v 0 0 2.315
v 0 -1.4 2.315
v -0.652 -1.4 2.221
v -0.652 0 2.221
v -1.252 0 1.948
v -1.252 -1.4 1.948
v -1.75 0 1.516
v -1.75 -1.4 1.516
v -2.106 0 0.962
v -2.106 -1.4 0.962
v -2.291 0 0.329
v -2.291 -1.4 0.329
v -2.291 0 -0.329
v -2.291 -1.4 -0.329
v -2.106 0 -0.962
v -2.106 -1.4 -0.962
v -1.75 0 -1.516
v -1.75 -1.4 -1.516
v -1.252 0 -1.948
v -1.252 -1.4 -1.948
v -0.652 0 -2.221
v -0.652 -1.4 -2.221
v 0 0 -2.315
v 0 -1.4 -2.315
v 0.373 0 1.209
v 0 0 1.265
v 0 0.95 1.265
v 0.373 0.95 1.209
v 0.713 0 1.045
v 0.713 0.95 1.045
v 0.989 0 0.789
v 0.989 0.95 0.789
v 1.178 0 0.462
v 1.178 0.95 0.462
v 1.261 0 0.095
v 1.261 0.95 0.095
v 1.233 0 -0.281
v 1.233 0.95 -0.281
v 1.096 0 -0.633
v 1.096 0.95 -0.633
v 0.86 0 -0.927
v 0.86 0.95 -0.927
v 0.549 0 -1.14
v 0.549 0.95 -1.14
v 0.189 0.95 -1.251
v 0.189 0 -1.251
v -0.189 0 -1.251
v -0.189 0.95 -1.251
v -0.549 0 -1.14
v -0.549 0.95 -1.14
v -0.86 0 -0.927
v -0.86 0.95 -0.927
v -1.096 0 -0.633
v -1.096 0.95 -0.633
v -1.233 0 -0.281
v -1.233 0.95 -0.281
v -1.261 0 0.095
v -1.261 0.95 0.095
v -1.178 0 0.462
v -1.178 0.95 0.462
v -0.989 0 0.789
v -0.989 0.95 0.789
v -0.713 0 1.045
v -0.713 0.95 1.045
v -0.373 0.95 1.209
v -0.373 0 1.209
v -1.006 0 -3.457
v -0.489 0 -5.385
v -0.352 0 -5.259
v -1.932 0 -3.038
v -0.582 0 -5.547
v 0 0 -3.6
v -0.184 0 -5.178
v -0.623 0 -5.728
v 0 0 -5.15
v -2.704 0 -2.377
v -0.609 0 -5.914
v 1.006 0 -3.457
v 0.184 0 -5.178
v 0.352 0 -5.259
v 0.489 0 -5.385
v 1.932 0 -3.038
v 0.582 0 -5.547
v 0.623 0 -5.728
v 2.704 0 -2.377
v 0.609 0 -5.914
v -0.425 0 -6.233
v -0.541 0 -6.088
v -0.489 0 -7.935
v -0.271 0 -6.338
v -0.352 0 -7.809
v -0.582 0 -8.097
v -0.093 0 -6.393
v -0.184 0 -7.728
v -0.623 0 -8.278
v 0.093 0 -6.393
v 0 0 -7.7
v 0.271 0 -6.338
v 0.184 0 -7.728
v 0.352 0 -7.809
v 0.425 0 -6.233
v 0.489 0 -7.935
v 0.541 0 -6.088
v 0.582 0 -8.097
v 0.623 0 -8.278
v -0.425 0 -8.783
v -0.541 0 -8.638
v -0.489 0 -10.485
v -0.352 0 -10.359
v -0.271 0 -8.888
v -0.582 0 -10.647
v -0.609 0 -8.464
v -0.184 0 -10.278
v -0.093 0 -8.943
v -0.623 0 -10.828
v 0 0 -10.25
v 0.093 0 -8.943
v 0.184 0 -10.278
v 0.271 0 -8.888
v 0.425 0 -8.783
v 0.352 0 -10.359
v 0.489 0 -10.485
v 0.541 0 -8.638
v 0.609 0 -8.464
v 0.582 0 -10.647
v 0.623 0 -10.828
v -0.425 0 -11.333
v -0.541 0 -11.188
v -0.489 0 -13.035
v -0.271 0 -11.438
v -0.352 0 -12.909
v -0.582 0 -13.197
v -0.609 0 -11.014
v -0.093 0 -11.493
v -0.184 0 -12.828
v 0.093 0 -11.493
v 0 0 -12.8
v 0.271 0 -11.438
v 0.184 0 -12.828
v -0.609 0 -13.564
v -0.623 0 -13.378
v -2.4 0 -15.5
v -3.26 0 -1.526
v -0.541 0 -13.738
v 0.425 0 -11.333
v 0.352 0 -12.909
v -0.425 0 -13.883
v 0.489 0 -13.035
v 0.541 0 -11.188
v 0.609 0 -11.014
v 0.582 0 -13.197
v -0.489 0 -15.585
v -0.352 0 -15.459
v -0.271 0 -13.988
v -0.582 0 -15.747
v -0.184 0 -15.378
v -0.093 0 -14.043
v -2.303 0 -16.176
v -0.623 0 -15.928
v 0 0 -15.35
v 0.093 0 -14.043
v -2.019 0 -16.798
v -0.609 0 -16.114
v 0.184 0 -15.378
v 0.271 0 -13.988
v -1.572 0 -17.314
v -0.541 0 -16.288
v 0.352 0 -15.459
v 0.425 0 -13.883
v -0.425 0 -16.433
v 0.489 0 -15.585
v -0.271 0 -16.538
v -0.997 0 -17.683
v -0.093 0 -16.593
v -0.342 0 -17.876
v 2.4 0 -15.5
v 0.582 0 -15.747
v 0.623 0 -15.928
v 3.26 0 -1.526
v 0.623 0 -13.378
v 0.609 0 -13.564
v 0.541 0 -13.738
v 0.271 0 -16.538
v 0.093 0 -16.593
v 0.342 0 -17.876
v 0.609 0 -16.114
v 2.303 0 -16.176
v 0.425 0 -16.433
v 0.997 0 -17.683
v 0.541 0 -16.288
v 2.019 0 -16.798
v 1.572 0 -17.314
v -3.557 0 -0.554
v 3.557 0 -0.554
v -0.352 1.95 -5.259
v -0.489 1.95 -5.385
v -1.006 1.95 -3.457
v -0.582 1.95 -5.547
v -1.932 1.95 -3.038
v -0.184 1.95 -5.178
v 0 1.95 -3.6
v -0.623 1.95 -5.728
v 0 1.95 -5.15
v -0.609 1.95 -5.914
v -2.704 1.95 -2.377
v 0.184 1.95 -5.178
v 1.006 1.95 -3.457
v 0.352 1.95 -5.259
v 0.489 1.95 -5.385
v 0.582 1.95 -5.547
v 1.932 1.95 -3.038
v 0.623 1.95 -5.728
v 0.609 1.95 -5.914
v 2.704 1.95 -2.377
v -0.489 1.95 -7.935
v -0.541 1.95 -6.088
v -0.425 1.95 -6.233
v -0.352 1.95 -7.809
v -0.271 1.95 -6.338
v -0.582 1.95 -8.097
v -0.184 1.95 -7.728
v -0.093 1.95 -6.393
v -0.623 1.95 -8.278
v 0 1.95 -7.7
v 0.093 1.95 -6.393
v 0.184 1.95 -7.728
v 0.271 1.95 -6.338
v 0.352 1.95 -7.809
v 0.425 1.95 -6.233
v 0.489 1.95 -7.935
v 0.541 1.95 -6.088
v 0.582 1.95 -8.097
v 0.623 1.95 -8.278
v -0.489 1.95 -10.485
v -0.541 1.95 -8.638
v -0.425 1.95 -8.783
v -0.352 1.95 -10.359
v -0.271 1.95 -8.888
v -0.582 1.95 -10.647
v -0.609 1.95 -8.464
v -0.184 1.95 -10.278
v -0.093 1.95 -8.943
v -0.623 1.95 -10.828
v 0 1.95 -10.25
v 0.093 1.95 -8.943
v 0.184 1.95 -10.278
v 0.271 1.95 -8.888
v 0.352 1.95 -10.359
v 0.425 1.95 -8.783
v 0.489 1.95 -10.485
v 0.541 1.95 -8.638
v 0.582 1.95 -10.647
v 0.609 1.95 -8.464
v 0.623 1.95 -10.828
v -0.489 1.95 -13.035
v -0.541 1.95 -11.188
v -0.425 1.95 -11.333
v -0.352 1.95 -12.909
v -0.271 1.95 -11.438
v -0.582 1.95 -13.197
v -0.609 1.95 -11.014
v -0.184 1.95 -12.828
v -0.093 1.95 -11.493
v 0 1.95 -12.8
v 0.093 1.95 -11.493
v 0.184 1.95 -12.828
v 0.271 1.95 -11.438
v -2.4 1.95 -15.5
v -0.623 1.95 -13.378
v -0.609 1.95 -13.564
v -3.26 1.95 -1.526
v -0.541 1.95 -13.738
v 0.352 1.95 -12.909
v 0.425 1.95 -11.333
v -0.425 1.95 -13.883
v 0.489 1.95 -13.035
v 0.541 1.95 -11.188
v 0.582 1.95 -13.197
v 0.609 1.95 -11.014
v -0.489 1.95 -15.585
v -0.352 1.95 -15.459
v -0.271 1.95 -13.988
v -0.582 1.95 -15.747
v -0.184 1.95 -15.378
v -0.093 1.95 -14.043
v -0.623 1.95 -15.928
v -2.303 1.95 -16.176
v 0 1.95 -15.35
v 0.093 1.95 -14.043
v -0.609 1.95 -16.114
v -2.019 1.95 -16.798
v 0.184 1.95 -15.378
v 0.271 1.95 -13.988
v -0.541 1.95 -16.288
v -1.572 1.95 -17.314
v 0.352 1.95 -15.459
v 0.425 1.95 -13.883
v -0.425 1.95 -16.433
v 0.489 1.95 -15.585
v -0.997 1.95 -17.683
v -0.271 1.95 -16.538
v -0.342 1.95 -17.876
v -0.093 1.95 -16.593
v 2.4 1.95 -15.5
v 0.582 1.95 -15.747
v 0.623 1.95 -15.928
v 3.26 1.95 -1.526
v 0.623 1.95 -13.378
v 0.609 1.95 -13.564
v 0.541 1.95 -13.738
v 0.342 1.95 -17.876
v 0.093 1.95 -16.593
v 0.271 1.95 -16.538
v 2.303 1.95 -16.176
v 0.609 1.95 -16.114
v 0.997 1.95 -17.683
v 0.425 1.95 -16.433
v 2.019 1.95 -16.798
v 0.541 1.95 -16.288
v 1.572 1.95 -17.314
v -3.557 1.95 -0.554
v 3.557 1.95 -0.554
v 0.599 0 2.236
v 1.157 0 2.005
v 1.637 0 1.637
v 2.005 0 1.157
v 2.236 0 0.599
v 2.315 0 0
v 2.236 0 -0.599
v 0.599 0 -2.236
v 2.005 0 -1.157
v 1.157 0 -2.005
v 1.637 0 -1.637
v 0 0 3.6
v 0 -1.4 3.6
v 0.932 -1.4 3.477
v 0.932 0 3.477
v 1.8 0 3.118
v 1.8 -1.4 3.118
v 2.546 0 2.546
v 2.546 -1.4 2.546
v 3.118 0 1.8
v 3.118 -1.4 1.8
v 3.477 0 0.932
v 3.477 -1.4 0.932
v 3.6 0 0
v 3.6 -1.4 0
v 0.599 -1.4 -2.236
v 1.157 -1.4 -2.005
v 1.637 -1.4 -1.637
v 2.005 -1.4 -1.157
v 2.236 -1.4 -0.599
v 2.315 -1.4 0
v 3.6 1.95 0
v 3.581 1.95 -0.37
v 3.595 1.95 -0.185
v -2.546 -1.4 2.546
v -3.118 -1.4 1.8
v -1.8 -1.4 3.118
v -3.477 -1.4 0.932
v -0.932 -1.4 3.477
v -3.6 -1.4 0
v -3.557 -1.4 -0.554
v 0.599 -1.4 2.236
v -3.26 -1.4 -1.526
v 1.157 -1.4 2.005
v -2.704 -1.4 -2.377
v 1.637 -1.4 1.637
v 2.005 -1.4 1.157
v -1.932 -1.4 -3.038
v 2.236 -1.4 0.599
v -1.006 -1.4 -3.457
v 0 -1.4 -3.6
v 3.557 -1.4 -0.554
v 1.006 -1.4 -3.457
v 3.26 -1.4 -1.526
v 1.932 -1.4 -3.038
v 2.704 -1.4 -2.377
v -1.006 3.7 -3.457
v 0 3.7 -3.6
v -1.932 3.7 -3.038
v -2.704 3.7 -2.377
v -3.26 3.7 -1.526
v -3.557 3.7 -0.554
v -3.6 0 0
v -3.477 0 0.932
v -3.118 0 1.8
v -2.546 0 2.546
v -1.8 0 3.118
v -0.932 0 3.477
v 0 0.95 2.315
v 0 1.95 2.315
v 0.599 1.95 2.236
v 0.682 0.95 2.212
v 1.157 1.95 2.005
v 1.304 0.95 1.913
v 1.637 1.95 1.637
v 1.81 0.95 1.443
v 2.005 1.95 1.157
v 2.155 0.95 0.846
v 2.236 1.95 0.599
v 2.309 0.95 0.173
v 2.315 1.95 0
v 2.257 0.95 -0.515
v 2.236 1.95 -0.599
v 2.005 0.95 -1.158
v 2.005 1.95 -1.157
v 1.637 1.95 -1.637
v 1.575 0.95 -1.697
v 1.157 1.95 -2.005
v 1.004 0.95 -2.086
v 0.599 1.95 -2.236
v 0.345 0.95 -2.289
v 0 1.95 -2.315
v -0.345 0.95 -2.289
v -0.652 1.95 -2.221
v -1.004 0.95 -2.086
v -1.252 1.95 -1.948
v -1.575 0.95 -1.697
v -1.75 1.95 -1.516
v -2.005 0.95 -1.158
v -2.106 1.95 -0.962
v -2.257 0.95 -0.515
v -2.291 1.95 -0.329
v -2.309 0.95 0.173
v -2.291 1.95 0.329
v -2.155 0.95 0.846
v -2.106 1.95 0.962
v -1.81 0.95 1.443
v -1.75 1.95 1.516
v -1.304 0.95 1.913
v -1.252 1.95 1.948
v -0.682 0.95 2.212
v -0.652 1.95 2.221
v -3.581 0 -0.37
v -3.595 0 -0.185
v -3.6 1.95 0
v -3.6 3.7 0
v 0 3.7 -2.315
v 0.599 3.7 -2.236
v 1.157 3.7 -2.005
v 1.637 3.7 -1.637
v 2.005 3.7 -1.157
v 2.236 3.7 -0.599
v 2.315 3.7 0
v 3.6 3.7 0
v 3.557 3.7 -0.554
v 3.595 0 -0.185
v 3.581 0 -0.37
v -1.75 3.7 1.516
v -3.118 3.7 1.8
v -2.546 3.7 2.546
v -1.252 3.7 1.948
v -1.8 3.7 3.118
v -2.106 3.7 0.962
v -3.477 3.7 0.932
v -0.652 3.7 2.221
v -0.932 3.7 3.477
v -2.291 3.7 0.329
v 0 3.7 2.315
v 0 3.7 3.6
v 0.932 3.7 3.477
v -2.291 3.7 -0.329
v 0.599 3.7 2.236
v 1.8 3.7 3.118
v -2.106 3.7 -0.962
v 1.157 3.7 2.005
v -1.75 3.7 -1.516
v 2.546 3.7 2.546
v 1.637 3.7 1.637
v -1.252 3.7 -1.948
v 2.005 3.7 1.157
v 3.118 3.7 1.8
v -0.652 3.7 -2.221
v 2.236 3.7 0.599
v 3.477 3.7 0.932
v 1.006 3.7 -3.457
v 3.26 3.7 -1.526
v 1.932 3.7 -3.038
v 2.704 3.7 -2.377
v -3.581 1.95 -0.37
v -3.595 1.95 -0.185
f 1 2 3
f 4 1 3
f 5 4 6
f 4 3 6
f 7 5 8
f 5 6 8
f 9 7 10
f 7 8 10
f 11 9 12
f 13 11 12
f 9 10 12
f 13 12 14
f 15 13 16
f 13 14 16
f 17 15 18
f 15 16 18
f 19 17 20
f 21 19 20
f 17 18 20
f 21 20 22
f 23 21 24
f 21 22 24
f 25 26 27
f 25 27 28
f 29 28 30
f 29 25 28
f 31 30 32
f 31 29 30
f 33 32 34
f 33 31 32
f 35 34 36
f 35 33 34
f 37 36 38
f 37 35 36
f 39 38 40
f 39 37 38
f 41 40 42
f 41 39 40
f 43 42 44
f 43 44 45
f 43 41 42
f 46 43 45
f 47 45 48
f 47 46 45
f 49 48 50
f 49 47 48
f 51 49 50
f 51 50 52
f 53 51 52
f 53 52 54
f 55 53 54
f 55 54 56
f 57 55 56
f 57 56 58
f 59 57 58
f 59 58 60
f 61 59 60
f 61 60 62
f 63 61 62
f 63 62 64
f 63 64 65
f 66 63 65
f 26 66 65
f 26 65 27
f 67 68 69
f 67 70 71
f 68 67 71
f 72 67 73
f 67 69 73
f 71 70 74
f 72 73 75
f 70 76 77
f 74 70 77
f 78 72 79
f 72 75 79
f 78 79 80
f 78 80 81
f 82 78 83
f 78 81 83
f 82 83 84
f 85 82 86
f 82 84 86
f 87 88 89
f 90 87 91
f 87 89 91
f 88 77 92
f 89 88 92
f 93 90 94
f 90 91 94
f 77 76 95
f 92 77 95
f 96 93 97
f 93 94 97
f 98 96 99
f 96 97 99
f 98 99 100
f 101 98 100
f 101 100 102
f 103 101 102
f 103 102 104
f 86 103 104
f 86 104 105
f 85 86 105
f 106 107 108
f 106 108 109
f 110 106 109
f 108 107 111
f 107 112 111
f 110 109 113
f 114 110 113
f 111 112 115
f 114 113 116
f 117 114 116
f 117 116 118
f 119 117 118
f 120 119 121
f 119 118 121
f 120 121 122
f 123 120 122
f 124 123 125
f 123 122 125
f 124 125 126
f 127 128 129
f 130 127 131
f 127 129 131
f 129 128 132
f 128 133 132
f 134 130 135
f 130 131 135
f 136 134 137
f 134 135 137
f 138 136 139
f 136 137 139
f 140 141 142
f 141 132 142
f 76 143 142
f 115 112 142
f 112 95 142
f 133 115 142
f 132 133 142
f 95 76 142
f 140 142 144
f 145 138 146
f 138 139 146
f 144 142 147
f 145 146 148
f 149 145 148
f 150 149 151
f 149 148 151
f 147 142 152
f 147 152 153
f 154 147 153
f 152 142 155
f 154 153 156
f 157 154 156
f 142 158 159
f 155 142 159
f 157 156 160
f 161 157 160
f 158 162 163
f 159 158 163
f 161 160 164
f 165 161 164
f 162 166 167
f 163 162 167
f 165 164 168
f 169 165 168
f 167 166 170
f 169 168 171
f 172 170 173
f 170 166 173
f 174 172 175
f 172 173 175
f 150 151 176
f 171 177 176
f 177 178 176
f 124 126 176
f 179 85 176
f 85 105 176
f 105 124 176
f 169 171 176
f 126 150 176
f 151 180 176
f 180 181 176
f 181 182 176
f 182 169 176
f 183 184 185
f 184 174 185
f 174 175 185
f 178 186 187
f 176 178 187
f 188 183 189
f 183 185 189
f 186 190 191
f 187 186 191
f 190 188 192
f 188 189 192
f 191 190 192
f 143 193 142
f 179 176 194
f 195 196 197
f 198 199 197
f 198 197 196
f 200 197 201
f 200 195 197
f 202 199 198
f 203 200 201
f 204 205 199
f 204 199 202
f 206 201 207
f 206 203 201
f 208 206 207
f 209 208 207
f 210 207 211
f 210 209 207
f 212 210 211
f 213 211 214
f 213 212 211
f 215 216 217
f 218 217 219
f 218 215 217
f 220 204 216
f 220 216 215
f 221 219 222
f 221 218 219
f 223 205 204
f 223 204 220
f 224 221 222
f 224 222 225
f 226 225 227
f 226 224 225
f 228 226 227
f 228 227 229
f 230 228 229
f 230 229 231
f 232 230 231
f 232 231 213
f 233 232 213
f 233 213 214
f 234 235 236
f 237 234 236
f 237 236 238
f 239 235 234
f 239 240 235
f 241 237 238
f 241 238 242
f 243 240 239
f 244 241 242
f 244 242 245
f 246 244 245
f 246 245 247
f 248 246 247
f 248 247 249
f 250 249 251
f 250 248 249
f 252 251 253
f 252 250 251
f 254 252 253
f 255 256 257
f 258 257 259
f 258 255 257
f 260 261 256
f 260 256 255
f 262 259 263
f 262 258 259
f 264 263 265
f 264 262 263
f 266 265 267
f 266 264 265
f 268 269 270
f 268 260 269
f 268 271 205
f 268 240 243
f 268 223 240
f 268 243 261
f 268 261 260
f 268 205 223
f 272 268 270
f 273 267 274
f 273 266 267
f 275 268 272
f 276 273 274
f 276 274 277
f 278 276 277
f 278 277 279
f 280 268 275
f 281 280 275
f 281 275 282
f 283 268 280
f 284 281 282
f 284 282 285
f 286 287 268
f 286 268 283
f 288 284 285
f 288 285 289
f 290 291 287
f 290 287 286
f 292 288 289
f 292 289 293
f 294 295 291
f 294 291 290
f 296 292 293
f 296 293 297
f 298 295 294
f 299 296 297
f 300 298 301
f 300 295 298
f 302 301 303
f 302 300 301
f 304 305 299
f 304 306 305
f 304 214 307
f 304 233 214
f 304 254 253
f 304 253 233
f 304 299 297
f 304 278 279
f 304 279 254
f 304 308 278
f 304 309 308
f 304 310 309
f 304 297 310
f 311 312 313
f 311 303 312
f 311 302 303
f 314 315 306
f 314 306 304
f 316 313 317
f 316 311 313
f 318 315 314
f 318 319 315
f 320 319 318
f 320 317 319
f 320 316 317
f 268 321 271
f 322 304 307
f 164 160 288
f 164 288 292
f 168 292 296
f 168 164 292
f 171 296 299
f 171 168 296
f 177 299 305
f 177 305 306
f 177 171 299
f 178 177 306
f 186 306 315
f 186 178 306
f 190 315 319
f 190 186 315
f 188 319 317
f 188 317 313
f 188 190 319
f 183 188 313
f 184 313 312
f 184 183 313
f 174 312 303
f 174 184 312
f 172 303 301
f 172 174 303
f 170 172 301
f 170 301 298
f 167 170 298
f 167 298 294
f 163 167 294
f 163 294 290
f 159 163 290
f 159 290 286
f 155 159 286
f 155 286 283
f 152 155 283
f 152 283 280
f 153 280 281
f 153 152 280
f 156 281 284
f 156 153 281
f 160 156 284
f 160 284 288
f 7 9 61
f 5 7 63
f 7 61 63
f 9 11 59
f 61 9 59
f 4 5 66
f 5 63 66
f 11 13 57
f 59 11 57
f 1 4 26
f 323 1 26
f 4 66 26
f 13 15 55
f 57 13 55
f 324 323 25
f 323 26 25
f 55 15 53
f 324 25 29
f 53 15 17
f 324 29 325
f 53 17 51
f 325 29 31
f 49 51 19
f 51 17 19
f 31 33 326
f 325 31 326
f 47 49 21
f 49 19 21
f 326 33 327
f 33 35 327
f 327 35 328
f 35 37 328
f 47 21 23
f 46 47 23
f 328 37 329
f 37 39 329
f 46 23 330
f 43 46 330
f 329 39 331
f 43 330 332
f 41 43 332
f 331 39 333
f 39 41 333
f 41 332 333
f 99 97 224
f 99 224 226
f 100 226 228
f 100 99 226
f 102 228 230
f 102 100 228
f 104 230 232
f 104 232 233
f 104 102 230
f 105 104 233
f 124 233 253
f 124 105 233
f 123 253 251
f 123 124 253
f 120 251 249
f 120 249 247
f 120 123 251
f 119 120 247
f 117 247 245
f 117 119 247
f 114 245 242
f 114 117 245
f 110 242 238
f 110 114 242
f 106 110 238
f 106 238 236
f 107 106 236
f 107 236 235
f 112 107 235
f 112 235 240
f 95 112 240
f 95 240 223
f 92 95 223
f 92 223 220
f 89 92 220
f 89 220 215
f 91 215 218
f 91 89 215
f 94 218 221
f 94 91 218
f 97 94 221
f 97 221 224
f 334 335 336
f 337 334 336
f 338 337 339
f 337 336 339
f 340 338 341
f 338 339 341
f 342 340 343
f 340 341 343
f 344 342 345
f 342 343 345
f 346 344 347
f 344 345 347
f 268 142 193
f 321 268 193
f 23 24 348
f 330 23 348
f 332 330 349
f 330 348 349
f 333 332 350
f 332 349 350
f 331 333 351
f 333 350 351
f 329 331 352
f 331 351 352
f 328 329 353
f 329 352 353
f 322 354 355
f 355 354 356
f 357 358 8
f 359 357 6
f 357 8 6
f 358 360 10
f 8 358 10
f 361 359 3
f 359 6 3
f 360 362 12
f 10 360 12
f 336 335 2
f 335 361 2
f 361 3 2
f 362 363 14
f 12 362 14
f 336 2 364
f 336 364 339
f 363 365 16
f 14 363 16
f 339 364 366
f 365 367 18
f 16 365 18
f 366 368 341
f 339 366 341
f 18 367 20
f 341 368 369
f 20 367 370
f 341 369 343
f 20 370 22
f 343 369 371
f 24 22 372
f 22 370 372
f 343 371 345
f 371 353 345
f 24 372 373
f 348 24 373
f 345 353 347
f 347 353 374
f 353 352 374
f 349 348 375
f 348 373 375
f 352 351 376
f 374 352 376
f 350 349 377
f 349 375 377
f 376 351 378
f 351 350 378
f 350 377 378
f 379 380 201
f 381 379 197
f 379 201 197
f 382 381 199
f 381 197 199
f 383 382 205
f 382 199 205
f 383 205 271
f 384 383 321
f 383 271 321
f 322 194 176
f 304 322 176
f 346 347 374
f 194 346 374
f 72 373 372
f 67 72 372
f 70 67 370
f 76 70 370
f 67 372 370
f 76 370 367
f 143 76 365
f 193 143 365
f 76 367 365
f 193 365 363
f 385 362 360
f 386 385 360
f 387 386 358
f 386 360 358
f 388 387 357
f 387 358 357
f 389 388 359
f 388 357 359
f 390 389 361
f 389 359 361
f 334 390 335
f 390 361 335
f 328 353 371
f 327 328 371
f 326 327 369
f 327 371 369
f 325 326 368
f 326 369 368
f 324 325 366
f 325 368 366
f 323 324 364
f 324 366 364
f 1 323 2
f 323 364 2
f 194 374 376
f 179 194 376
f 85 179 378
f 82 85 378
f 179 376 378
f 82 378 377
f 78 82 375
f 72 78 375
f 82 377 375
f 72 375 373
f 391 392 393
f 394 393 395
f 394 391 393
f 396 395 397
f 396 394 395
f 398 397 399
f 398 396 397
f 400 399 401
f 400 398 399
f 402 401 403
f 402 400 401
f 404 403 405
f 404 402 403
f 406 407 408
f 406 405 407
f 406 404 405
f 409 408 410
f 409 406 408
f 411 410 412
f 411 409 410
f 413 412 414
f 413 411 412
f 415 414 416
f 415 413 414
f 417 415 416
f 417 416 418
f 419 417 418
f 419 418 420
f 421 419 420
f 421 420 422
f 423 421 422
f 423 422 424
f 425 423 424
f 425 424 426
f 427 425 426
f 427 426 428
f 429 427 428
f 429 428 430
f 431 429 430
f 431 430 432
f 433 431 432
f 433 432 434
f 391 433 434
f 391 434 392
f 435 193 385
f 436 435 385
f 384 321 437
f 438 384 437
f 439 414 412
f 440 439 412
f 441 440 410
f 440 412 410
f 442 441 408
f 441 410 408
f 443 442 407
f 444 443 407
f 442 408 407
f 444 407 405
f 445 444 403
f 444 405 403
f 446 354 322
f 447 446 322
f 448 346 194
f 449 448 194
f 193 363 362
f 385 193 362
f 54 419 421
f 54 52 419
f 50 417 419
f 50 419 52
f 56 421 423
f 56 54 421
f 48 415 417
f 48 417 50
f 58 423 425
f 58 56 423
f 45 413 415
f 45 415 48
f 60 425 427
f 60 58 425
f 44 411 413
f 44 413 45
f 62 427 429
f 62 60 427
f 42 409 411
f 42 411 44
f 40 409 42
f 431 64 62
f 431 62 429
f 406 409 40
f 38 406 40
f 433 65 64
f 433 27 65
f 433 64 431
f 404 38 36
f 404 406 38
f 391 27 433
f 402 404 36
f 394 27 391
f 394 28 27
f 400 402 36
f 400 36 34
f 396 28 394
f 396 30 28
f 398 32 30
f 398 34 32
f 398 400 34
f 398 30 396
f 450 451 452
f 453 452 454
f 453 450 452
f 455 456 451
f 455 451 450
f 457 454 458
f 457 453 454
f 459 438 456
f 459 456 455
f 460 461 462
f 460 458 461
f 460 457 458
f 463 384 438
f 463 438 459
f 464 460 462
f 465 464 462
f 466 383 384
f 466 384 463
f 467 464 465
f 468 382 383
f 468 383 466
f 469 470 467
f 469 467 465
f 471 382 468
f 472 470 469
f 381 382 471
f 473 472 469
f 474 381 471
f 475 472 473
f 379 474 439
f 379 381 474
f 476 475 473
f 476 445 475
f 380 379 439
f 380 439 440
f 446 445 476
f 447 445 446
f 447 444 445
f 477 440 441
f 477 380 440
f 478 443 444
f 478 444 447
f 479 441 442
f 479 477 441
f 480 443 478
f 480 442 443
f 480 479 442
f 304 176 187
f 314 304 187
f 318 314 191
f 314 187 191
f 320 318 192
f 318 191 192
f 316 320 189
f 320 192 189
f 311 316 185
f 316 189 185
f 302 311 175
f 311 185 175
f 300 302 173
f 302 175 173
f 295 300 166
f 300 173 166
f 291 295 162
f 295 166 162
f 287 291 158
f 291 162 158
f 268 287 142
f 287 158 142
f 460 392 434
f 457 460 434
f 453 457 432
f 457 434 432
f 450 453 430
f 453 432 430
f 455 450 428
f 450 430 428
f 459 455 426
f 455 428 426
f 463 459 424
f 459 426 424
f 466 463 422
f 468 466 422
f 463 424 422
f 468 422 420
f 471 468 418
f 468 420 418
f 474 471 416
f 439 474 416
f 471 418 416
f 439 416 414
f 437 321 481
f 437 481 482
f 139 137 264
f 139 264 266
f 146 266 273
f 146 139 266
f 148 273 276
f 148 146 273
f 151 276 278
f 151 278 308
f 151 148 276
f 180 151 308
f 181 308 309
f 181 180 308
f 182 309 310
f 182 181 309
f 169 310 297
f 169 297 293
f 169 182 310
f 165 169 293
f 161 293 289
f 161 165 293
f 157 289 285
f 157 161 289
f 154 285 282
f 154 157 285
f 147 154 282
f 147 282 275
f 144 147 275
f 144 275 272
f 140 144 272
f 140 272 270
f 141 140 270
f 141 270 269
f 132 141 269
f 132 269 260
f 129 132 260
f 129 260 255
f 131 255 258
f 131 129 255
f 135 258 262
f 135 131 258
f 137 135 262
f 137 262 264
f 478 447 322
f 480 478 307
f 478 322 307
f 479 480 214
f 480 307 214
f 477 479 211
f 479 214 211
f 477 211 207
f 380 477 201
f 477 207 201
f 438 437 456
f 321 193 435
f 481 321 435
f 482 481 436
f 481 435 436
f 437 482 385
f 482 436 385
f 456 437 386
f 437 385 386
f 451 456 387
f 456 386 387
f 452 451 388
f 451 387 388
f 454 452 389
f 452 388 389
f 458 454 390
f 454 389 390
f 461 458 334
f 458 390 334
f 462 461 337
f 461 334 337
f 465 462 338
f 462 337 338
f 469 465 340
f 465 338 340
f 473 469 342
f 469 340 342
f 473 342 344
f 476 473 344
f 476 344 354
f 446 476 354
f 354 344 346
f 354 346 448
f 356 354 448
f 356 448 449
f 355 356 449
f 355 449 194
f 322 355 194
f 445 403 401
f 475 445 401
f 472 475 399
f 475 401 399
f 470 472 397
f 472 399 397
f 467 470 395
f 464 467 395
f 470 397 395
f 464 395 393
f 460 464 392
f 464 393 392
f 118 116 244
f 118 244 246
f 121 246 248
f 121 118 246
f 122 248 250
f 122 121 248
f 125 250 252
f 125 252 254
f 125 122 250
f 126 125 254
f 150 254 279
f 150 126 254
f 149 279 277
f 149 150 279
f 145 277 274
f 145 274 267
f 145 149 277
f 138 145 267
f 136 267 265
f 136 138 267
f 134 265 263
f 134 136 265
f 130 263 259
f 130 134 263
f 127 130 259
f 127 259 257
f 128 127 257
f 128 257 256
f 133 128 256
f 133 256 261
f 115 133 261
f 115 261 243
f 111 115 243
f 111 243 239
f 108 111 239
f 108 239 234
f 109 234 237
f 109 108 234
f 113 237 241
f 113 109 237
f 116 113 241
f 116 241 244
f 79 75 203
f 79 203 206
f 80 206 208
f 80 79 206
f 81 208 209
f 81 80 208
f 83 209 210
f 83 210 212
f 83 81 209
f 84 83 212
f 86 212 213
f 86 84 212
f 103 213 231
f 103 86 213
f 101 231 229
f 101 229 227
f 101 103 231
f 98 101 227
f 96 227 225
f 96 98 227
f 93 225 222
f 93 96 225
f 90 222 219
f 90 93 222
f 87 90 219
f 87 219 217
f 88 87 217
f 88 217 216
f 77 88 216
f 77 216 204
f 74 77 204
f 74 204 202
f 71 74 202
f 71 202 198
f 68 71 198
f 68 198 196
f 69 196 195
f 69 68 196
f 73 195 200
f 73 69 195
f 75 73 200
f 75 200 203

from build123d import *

# Parameters (mm, degrees)
SKETCH1_R           = 0.625
SKETCH1_R_2         = 1.265
BOSS_EXTRUDE2_DEPTH = 1.95
BOSS_EXTRUDE3_START = -1.4
SKETCH1_4_R         = 2.315
BOSS_EXTRUDE3_DEPTH = 1.4
SKETCH1_5_R         = 2.315
BOSS_EXTRUDE4_DEPTH = 3.7
CUT_EXTRUDE1_START  = -1
SKETCH4_R           = 2.315
SKETCH4_R_2         = 1.265
CUT_EXTRUDE1_DEPTH  = 1


with BuildPart() as part:
    # Sketch1 → Boss-Extrude2 (new body)
    with BuildSketch(Plane(origin=(0, 0, 0), x_dir=(1, 0, 0), z_dir=(0, 1, 0))):
        with BuildLine():
            Line((3.557102073, 0.554098225), (2.4, 15.5))
            ThreePointArc((2.4, 15.5), (0, 17.9), (-2.4, 15.5))
            Line((-2.4, 15.5), (-3.557102073, 0.554098225))
            ThreePointArc((-3.557102073, 0.554098225), (0, -3.6), (3.557102073, 0.554098225))
        make_face()
        with Locations((0, 13.425)):
            Circle(SKETCH1_R, mode=Mode.SUBTRACT)
        with Locations((0, 10.875)):
            Circle(SKETCH1_R, mode=Mode.SUBTRACT)
        with Locations((0, 8.325)):
            Circle(SKETCH1_R, mode=Mode.SUBTRACT)
        with Locations((0, 5.775)):
            Circle(SKETCH1_R, mode=Mode.SUBTRACT)
        Circle(SKETCH1_R_2, mode=Mode.SUBTRACT)
        with Locations((0, 15.975)):
            Circle(SKETCH1_R, mode=Mode.SUBTRACT)
    extrude(amount=BOSS_EXTRUDE2_DEPTH)

    # Sketch1<4> → Boss-Extrude3 (add)
    with BuildSketch(Plane(origin=(0, 0, 0), x_dir=(1, 0, 0), z_dir=(0, 1, 0)).offset(BOSS_EXTRUDE3_START)):
        with BuildLine():
            ThreePointArc((-3.6, 0), (0, -3.6), (3.6, 0))
            Line((3.6, 0), (3.557102073, 0.554098225))
            ThreePointArc((3.557102073, 0.554098225), (0, 3.6), (-3.557102073, 0.554098225))
            Line((-3.557102073, 0.554098225), (-3.6, 0))
        make_face()
        Circle(SKETCH1_4_R, mode=Mode.SUBTRACT)
    extrude(amount=BOSS_EXTRUDE3_DEPTH)

    # Sketch1<5> → Boss-Extrude4 (add)
    with BuildSketch(Plane(origin=(0, 0, 0), x_dir=(1, 0, 0), z_dir=(0, 1, 0))):
        with BuildLine():
            ThreePointArc((-3.6, 0), (0, -3.6), (3.6, 0))
            Line((3.6, 0), (3.557102073, 0.554098225))
            ThreePointArc((3.557102073, 0.554098225), (0, 3.6), (-3.557102073, 0.554098225))
            Line((-3.557102073, 0.554098225), (-3.6, 0))
        make_face()
        Circle(SKETCH1_5_R, mode=Mode.SUBTRACT)
    extrude(amount=BOSS_EXTRUDE4_DEPTH)

    # Sketch4 → Cut-Extrude1 (cut)
    with BuildSketch(Plane(origin=(0, 1.95, 0), x_dir=(1, 0, 0), z_dir=(0, 1, 0)).offset(CUT_EXTRUDE1_START)):
        Circle(SKETCH4_R)
        Circle(SKETCH4_R_2, mode=Mode.SUBTRACT)
    extrude(amount=CUT_EXTRUDE1_DEPTH, mode=Mode.SUBTRACT)


solid = part.part
